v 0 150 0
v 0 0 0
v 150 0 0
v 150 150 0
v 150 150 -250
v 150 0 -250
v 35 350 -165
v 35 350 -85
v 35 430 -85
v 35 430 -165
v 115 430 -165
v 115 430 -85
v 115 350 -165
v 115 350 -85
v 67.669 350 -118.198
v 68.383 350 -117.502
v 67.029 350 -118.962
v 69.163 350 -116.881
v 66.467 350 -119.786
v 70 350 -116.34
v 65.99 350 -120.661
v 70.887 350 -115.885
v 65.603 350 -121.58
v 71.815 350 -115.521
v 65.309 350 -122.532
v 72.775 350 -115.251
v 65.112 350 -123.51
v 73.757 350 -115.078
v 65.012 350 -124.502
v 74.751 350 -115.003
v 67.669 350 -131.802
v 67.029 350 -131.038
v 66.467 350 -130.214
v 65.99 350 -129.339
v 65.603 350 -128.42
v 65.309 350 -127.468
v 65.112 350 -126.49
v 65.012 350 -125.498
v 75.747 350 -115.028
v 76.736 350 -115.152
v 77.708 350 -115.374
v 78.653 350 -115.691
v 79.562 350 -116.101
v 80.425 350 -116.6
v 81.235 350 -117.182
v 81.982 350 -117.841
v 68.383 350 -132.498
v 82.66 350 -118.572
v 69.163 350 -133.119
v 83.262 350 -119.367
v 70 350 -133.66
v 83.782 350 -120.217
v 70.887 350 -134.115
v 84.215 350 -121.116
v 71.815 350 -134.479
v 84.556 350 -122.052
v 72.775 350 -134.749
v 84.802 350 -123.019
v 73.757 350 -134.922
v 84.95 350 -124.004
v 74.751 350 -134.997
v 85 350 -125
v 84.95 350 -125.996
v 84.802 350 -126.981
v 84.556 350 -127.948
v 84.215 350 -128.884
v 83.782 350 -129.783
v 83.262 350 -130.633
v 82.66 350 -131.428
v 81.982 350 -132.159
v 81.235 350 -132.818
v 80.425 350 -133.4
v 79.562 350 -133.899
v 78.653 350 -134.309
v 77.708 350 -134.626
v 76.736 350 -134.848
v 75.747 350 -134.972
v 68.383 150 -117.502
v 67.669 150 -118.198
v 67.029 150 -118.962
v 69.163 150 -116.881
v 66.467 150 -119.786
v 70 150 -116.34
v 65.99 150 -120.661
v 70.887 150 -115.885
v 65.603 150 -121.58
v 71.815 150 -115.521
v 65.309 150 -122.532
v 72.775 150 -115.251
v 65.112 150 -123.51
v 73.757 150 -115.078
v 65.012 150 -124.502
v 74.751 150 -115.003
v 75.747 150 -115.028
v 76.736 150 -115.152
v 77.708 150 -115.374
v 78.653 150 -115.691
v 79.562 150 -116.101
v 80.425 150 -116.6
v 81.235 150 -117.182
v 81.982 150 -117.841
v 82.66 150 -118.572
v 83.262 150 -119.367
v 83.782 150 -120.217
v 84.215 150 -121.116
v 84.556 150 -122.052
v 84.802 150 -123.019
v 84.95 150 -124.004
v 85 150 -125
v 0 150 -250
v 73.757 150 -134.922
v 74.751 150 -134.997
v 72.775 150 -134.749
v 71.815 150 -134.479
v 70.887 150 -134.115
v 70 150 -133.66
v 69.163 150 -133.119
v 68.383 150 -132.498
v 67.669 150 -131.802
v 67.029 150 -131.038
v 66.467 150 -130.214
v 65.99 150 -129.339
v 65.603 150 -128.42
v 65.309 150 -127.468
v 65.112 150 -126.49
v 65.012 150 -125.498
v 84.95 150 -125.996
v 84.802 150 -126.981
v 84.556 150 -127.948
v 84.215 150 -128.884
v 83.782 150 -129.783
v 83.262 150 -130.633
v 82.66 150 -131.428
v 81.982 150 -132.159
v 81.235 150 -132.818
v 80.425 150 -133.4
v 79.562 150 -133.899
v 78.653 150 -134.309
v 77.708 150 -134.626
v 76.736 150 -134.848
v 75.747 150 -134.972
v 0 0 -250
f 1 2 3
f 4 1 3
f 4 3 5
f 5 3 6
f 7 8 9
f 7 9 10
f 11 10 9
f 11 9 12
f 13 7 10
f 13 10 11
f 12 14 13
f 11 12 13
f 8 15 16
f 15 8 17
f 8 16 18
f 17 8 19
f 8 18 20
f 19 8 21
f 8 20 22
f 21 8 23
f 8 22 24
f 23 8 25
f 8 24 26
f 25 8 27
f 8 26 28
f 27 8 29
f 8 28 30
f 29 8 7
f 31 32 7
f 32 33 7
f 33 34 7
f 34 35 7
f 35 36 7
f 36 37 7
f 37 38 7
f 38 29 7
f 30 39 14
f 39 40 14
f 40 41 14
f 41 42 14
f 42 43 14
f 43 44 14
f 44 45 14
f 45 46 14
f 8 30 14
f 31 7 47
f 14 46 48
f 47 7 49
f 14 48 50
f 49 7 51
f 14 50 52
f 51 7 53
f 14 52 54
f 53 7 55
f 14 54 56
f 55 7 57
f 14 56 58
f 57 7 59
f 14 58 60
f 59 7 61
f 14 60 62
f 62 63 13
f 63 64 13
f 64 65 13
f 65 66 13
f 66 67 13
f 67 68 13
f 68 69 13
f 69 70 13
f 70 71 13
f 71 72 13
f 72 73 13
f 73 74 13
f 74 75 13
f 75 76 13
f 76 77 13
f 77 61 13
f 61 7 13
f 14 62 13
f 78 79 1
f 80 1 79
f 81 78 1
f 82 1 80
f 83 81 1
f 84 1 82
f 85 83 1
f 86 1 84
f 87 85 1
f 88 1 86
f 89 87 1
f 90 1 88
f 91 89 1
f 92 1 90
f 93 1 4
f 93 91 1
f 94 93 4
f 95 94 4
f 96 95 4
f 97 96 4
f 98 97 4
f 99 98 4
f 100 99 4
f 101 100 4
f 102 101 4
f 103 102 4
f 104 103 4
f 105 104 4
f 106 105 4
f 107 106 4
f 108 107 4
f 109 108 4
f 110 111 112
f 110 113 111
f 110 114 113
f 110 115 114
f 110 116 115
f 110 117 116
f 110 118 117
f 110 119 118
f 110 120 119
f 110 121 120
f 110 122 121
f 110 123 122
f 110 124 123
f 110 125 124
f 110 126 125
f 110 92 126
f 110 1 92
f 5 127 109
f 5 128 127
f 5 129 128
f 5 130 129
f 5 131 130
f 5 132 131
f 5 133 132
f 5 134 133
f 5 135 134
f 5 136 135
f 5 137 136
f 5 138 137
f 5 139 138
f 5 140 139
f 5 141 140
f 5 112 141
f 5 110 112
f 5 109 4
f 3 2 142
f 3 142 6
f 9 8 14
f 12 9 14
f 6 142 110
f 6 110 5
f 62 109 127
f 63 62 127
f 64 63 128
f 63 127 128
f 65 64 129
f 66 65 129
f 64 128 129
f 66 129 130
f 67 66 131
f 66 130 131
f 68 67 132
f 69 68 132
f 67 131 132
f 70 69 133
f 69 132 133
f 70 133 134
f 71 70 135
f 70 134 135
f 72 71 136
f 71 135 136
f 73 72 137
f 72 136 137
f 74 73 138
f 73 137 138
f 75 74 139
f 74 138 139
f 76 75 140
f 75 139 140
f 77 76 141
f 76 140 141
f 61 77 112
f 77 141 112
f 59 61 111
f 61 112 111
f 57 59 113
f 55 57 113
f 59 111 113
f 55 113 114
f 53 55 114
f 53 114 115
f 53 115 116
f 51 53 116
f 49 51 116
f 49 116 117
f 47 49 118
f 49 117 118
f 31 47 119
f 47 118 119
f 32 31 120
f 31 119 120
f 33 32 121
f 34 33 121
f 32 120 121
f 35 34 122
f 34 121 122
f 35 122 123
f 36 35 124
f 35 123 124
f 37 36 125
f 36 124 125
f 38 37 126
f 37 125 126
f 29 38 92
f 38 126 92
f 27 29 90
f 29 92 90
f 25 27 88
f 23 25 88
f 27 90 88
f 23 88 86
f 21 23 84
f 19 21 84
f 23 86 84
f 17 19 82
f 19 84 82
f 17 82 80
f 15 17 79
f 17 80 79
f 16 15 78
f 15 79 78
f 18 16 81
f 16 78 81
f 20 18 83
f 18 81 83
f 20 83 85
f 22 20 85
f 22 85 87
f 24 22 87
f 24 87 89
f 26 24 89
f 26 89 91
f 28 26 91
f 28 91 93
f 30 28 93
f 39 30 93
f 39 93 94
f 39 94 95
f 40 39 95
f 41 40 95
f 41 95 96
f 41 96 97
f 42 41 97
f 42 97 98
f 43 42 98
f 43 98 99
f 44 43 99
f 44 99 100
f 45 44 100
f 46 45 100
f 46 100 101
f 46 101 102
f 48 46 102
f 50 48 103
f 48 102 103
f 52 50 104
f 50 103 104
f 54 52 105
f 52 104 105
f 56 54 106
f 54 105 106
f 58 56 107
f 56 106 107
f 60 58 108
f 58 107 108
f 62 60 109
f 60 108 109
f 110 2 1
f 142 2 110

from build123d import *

# Parameters (mm, degrees)
ESQUISSE1_W      = 150
ESQUISSE1_H      = 250
EXTRUSION1_DEPTH = 150
ESQUISSE2_R      = 10
EXTRUSION2_DEPTH = 200
ESQUISSE3_W      = 80
ESQUISSE3_H      = 80
EXTRUSION3_DEPTH = 80


with BuildPart() as part:
    # Esquisse1 → Extrusion1 (new body)
    with BuildSketch(Plane(origin=(0, 0, 0), x_dir=(1, 0, 0), z_dir=(0, 1, 0))):
        with Locations((75, 125)):
            Rectangle(ESQUISSE1_W, ESQUISSE1_H)
    extrude(amount=EXTRUSION1_DEPTH)

    # Esquisse2 → Extrusion2 (add)
    with BuildSketch(Plane(origin=(0, 150, 0), x_dir=(1, 0, 0), z_dir=(0, 1, 0))):
        with Locations((75, 125)):
            Circle(ESQUISSE2_R)
    extrude(amount=EXTRUSION2_DEPTH)

    # Esquisse3 → Extrusion3 (add)
    with BuildSketch(Plane(origin=(0, 350, 0), x_dir=(1, 0, 0), z_dir=(0, 1, 0))):
        with Locations((75, 125)):
            Rectangle(ESQUISSE3_W, ESQUISSE3_H)
    extrude(amount=EXTRUSION3_DEPTH)


solid = part.part
